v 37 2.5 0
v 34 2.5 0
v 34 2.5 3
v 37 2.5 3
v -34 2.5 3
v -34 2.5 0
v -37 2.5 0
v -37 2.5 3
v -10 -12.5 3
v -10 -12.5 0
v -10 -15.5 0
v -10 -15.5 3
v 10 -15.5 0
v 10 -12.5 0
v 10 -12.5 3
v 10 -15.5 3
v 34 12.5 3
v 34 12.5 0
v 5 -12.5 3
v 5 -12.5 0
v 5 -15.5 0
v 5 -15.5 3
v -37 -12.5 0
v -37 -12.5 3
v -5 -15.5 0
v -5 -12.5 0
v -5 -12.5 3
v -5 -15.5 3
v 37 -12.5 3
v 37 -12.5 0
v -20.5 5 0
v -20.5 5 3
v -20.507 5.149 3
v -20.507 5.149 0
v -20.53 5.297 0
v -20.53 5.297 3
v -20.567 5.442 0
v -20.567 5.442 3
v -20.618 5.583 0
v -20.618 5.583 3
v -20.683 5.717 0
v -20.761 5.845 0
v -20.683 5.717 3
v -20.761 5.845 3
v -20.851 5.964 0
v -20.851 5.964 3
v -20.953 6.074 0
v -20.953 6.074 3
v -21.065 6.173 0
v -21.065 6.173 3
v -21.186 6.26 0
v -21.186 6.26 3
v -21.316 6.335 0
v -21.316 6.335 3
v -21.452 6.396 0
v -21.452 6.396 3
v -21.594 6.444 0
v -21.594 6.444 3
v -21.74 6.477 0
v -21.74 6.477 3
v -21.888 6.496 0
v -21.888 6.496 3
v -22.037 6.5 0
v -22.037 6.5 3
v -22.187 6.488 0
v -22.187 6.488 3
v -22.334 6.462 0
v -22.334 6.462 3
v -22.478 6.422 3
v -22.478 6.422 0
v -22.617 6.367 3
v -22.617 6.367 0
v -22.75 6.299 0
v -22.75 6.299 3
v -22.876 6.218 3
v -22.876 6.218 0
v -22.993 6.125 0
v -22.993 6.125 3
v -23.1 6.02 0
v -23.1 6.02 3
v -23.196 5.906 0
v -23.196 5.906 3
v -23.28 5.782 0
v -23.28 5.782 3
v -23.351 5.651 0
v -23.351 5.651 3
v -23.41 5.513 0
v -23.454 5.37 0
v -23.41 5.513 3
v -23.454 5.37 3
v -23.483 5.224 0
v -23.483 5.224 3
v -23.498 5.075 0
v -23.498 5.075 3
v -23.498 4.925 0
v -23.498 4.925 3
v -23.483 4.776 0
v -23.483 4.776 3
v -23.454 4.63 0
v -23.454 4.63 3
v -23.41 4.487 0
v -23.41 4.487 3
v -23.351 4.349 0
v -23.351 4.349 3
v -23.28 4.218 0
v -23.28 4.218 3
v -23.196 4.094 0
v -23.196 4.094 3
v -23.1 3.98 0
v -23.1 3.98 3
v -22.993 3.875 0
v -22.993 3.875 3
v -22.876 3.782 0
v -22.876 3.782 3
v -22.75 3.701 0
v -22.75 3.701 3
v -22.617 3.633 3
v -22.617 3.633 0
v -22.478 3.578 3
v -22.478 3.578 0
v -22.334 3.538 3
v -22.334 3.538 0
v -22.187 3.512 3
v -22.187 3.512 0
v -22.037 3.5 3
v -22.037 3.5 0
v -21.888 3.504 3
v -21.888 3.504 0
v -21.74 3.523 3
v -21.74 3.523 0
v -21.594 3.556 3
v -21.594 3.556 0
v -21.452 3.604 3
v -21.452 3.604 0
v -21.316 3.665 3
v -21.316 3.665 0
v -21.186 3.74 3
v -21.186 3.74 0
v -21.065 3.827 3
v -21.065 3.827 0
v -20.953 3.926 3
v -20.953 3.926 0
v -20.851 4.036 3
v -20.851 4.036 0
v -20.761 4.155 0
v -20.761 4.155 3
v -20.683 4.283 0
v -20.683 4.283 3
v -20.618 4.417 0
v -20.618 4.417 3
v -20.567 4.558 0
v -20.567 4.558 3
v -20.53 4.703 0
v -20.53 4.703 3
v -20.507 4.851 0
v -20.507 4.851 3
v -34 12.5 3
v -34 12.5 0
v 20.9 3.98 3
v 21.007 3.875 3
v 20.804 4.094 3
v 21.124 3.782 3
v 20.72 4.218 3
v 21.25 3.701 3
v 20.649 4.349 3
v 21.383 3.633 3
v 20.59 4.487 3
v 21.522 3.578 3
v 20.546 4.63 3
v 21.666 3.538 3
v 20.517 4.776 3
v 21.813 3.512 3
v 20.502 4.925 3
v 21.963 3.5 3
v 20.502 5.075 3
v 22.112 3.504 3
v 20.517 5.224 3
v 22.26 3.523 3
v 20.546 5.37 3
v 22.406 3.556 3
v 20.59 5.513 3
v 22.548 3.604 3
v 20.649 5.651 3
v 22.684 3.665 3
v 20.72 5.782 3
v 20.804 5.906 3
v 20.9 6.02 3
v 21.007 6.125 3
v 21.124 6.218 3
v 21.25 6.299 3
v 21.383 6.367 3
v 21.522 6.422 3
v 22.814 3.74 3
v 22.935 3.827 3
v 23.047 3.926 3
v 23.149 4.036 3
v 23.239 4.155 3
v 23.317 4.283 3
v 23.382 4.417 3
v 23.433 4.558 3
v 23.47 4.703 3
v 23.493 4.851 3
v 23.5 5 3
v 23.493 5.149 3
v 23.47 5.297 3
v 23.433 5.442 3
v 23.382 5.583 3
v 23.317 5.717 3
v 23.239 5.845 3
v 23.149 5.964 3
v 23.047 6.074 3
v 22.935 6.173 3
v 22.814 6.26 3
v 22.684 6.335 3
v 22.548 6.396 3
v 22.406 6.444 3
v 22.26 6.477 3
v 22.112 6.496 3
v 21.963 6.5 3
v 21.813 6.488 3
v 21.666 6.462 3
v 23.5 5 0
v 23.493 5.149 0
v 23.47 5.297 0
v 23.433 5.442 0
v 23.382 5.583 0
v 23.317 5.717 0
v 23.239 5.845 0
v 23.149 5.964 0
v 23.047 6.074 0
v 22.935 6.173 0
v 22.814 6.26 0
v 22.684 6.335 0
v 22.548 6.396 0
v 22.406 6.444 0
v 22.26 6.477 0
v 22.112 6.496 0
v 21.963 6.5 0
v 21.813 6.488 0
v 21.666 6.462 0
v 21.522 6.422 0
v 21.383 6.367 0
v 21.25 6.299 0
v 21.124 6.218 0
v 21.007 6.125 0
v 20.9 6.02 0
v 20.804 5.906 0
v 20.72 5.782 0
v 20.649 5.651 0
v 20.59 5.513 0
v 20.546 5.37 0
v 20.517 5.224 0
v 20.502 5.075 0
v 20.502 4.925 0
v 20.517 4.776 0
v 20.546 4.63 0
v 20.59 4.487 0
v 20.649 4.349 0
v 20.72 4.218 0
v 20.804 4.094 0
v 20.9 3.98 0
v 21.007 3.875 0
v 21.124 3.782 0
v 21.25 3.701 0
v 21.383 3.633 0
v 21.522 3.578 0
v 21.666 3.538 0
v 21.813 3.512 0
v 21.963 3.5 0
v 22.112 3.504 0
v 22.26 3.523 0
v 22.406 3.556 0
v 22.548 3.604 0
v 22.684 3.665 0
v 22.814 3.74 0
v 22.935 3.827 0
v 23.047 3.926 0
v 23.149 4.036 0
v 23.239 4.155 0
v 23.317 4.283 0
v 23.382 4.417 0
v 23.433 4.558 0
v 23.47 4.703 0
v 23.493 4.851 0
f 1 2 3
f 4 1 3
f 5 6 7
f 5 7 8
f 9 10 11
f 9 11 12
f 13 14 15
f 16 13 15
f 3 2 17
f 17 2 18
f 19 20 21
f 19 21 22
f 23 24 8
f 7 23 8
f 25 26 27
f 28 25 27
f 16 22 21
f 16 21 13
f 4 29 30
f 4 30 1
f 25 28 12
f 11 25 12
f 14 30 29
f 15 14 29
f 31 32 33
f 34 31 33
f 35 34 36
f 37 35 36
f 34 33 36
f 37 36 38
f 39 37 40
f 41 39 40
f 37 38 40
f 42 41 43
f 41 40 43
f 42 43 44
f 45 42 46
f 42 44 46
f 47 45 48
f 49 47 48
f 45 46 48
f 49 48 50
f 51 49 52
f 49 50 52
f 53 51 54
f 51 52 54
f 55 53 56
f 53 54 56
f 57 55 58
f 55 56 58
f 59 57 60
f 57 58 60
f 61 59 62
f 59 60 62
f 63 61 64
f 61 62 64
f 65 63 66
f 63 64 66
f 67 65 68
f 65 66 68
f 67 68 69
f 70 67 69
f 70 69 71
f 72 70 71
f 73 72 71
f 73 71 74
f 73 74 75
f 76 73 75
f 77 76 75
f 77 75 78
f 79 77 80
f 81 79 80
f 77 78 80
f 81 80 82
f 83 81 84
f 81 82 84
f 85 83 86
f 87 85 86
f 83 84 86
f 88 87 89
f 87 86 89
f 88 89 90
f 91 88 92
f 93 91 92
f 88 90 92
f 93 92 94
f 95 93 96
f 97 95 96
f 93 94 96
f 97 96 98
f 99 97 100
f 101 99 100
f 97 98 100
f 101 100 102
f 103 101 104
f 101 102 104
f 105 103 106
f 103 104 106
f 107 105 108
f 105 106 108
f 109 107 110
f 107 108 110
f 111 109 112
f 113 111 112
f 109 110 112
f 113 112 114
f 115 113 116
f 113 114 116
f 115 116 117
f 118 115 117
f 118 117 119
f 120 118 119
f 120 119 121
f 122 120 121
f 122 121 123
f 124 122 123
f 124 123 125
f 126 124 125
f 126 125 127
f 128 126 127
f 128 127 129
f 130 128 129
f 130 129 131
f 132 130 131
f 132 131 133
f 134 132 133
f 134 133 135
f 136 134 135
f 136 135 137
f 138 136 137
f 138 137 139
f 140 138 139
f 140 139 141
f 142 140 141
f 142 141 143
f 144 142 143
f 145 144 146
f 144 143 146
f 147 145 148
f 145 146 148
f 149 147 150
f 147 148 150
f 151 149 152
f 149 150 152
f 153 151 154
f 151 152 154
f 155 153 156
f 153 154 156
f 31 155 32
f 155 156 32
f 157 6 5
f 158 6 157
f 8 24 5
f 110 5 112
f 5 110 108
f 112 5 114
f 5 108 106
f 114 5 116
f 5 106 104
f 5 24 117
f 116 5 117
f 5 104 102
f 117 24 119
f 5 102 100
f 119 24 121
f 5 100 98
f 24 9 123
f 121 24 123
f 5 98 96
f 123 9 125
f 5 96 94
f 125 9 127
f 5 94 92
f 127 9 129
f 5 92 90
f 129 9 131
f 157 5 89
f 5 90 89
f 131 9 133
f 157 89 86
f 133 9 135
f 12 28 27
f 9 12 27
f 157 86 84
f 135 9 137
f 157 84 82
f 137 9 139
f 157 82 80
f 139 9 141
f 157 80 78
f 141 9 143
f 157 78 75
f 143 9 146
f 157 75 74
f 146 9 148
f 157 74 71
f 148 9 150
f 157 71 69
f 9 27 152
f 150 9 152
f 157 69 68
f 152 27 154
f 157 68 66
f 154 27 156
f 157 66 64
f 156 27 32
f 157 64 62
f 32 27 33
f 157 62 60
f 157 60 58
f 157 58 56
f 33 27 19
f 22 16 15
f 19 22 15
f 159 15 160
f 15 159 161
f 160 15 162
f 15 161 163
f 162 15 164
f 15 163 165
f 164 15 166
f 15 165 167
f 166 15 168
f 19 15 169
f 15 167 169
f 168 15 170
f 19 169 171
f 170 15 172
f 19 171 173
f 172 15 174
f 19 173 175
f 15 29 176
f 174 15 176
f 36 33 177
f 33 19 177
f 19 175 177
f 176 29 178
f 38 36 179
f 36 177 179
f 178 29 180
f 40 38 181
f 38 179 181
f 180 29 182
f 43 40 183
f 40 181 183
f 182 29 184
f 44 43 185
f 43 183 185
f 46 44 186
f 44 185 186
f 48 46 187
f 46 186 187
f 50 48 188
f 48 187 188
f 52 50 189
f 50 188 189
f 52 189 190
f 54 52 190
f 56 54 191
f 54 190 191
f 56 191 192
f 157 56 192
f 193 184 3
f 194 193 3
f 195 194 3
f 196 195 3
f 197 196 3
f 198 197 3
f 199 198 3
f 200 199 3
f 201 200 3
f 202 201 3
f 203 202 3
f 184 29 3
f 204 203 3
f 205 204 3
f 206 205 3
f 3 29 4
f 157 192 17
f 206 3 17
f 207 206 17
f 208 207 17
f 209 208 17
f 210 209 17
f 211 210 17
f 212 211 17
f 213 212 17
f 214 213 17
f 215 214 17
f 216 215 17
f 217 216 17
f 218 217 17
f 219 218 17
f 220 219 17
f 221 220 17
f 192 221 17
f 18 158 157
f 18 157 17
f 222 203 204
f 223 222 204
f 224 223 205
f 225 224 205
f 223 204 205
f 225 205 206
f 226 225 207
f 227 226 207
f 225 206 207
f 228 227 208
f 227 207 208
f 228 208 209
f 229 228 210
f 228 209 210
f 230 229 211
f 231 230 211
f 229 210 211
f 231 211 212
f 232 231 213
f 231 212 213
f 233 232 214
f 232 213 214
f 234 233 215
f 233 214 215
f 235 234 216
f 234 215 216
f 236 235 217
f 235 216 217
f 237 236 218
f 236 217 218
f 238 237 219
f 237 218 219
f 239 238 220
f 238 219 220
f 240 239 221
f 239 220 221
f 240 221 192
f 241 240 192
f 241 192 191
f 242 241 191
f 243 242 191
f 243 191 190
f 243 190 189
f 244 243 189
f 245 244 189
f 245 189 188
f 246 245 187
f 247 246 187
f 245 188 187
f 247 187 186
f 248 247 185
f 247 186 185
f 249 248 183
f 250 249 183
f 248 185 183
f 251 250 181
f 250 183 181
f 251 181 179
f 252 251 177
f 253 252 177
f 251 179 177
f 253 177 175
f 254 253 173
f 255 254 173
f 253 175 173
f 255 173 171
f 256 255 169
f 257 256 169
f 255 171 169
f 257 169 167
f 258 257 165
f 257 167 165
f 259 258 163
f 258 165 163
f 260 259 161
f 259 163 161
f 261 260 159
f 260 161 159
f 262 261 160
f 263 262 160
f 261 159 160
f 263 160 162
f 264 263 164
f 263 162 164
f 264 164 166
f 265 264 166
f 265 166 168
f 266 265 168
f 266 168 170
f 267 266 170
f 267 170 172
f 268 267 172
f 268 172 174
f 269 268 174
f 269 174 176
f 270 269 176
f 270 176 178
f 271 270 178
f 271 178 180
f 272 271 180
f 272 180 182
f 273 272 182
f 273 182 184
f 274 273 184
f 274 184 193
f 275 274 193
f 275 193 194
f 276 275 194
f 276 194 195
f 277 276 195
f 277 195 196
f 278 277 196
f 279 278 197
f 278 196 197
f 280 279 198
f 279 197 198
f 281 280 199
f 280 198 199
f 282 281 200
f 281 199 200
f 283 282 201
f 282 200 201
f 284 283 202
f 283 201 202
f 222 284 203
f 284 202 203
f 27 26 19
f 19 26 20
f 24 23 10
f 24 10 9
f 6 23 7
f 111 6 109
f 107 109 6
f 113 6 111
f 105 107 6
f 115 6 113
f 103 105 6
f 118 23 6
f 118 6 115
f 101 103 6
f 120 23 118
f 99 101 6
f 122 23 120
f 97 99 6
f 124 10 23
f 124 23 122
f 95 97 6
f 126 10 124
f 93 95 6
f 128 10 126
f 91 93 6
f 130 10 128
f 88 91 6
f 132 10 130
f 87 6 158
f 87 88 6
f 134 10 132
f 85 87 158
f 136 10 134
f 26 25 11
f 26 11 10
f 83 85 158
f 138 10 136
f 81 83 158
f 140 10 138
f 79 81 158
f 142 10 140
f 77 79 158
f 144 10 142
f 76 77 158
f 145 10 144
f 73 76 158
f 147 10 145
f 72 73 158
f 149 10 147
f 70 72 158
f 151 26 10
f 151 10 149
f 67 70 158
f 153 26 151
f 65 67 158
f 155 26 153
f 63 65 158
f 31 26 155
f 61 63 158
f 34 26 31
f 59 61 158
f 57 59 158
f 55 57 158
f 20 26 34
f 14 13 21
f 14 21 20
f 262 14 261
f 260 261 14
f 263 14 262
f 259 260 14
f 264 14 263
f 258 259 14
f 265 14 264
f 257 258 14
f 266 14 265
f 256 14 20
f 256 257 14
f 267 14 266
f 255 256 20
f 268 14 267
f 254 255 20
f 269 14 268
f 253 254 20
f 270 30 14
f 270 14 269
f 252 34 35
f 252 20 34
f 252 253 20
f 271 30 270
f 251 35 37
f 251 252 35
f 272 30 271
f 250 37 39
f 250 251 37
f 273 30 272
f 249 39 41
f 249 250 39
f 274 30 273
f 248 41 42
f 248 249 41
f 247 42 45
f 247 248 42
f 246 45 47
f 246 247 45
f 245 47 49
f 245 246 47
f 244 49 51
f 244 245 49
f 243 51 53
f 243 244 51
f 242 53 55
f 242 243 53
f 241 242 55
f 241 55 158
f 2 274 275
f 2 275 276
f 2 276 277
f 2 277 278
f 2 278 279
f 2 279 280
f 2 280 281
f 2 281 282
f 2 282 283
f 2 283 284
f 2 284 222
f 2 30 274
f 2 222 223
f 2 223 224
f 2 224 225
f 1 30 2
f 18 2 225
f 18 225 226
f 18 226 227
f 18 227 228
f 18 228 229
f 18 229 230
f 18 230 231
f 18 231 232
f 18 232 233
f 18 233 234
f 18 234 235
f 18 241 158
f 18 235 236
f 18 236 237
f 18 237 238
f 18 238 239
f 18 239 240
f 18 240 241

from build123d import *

# Parameters (mm, degrees)
F0_W     = 68
F0_H     = 25
F1_DEPTH = 3
F2_W     = 5
F2_H     = 3
F3_DEPTH = 3
F4_W     = 15
F4_H     = 3
F5_DEPTH = 3
F7_R     = 1.5
F8_DEPTH = 3


# Not quite as in the source:
# - a feature names something its author has since deleted; it is built from what else it names


with BuildPart() as f1:
    # F0 (on Top) → F1 (new body)
    with BuildSketch(Plane.XY):
        Rectangle(F0_W, F0_H)
    extrude(amount=F1_DEPTH)

    # F2 (on face) → F3 (join)
    with BuildSketch(Plane.XZ.offset(12.5)):
        with Locations((7.5, 1.5)):
            Rectangle(F2_W, F2_H)
    extrude(amount=F3_DEPTH)

    # F4 (on face) → F5 (join)
    with BuildSketch(Plane.YZ.offset(34)):
        with Locations((-5, 1.5)):
            Rectangle(F4_W, F4_H)
    extrude(amount=F5_DEPTH)

    # F6: F1 across plane


with BuildPart() as f1_1:
    add(f1.part)
    add(f1.part.mirror(Plane.YZ))

    # F7 (on face) → F8 (cut)
    with BuildSketch(Plane.XY.offset(3)):
        with Locations((22, 5)):
            Circle(F7_R)
        with Locations((-22, 5)):
            Circle(F7_R)
    extrude(amount=-F8_DEPTH, mode=Mode.SUBTRACT)


solid = f1_1.part
